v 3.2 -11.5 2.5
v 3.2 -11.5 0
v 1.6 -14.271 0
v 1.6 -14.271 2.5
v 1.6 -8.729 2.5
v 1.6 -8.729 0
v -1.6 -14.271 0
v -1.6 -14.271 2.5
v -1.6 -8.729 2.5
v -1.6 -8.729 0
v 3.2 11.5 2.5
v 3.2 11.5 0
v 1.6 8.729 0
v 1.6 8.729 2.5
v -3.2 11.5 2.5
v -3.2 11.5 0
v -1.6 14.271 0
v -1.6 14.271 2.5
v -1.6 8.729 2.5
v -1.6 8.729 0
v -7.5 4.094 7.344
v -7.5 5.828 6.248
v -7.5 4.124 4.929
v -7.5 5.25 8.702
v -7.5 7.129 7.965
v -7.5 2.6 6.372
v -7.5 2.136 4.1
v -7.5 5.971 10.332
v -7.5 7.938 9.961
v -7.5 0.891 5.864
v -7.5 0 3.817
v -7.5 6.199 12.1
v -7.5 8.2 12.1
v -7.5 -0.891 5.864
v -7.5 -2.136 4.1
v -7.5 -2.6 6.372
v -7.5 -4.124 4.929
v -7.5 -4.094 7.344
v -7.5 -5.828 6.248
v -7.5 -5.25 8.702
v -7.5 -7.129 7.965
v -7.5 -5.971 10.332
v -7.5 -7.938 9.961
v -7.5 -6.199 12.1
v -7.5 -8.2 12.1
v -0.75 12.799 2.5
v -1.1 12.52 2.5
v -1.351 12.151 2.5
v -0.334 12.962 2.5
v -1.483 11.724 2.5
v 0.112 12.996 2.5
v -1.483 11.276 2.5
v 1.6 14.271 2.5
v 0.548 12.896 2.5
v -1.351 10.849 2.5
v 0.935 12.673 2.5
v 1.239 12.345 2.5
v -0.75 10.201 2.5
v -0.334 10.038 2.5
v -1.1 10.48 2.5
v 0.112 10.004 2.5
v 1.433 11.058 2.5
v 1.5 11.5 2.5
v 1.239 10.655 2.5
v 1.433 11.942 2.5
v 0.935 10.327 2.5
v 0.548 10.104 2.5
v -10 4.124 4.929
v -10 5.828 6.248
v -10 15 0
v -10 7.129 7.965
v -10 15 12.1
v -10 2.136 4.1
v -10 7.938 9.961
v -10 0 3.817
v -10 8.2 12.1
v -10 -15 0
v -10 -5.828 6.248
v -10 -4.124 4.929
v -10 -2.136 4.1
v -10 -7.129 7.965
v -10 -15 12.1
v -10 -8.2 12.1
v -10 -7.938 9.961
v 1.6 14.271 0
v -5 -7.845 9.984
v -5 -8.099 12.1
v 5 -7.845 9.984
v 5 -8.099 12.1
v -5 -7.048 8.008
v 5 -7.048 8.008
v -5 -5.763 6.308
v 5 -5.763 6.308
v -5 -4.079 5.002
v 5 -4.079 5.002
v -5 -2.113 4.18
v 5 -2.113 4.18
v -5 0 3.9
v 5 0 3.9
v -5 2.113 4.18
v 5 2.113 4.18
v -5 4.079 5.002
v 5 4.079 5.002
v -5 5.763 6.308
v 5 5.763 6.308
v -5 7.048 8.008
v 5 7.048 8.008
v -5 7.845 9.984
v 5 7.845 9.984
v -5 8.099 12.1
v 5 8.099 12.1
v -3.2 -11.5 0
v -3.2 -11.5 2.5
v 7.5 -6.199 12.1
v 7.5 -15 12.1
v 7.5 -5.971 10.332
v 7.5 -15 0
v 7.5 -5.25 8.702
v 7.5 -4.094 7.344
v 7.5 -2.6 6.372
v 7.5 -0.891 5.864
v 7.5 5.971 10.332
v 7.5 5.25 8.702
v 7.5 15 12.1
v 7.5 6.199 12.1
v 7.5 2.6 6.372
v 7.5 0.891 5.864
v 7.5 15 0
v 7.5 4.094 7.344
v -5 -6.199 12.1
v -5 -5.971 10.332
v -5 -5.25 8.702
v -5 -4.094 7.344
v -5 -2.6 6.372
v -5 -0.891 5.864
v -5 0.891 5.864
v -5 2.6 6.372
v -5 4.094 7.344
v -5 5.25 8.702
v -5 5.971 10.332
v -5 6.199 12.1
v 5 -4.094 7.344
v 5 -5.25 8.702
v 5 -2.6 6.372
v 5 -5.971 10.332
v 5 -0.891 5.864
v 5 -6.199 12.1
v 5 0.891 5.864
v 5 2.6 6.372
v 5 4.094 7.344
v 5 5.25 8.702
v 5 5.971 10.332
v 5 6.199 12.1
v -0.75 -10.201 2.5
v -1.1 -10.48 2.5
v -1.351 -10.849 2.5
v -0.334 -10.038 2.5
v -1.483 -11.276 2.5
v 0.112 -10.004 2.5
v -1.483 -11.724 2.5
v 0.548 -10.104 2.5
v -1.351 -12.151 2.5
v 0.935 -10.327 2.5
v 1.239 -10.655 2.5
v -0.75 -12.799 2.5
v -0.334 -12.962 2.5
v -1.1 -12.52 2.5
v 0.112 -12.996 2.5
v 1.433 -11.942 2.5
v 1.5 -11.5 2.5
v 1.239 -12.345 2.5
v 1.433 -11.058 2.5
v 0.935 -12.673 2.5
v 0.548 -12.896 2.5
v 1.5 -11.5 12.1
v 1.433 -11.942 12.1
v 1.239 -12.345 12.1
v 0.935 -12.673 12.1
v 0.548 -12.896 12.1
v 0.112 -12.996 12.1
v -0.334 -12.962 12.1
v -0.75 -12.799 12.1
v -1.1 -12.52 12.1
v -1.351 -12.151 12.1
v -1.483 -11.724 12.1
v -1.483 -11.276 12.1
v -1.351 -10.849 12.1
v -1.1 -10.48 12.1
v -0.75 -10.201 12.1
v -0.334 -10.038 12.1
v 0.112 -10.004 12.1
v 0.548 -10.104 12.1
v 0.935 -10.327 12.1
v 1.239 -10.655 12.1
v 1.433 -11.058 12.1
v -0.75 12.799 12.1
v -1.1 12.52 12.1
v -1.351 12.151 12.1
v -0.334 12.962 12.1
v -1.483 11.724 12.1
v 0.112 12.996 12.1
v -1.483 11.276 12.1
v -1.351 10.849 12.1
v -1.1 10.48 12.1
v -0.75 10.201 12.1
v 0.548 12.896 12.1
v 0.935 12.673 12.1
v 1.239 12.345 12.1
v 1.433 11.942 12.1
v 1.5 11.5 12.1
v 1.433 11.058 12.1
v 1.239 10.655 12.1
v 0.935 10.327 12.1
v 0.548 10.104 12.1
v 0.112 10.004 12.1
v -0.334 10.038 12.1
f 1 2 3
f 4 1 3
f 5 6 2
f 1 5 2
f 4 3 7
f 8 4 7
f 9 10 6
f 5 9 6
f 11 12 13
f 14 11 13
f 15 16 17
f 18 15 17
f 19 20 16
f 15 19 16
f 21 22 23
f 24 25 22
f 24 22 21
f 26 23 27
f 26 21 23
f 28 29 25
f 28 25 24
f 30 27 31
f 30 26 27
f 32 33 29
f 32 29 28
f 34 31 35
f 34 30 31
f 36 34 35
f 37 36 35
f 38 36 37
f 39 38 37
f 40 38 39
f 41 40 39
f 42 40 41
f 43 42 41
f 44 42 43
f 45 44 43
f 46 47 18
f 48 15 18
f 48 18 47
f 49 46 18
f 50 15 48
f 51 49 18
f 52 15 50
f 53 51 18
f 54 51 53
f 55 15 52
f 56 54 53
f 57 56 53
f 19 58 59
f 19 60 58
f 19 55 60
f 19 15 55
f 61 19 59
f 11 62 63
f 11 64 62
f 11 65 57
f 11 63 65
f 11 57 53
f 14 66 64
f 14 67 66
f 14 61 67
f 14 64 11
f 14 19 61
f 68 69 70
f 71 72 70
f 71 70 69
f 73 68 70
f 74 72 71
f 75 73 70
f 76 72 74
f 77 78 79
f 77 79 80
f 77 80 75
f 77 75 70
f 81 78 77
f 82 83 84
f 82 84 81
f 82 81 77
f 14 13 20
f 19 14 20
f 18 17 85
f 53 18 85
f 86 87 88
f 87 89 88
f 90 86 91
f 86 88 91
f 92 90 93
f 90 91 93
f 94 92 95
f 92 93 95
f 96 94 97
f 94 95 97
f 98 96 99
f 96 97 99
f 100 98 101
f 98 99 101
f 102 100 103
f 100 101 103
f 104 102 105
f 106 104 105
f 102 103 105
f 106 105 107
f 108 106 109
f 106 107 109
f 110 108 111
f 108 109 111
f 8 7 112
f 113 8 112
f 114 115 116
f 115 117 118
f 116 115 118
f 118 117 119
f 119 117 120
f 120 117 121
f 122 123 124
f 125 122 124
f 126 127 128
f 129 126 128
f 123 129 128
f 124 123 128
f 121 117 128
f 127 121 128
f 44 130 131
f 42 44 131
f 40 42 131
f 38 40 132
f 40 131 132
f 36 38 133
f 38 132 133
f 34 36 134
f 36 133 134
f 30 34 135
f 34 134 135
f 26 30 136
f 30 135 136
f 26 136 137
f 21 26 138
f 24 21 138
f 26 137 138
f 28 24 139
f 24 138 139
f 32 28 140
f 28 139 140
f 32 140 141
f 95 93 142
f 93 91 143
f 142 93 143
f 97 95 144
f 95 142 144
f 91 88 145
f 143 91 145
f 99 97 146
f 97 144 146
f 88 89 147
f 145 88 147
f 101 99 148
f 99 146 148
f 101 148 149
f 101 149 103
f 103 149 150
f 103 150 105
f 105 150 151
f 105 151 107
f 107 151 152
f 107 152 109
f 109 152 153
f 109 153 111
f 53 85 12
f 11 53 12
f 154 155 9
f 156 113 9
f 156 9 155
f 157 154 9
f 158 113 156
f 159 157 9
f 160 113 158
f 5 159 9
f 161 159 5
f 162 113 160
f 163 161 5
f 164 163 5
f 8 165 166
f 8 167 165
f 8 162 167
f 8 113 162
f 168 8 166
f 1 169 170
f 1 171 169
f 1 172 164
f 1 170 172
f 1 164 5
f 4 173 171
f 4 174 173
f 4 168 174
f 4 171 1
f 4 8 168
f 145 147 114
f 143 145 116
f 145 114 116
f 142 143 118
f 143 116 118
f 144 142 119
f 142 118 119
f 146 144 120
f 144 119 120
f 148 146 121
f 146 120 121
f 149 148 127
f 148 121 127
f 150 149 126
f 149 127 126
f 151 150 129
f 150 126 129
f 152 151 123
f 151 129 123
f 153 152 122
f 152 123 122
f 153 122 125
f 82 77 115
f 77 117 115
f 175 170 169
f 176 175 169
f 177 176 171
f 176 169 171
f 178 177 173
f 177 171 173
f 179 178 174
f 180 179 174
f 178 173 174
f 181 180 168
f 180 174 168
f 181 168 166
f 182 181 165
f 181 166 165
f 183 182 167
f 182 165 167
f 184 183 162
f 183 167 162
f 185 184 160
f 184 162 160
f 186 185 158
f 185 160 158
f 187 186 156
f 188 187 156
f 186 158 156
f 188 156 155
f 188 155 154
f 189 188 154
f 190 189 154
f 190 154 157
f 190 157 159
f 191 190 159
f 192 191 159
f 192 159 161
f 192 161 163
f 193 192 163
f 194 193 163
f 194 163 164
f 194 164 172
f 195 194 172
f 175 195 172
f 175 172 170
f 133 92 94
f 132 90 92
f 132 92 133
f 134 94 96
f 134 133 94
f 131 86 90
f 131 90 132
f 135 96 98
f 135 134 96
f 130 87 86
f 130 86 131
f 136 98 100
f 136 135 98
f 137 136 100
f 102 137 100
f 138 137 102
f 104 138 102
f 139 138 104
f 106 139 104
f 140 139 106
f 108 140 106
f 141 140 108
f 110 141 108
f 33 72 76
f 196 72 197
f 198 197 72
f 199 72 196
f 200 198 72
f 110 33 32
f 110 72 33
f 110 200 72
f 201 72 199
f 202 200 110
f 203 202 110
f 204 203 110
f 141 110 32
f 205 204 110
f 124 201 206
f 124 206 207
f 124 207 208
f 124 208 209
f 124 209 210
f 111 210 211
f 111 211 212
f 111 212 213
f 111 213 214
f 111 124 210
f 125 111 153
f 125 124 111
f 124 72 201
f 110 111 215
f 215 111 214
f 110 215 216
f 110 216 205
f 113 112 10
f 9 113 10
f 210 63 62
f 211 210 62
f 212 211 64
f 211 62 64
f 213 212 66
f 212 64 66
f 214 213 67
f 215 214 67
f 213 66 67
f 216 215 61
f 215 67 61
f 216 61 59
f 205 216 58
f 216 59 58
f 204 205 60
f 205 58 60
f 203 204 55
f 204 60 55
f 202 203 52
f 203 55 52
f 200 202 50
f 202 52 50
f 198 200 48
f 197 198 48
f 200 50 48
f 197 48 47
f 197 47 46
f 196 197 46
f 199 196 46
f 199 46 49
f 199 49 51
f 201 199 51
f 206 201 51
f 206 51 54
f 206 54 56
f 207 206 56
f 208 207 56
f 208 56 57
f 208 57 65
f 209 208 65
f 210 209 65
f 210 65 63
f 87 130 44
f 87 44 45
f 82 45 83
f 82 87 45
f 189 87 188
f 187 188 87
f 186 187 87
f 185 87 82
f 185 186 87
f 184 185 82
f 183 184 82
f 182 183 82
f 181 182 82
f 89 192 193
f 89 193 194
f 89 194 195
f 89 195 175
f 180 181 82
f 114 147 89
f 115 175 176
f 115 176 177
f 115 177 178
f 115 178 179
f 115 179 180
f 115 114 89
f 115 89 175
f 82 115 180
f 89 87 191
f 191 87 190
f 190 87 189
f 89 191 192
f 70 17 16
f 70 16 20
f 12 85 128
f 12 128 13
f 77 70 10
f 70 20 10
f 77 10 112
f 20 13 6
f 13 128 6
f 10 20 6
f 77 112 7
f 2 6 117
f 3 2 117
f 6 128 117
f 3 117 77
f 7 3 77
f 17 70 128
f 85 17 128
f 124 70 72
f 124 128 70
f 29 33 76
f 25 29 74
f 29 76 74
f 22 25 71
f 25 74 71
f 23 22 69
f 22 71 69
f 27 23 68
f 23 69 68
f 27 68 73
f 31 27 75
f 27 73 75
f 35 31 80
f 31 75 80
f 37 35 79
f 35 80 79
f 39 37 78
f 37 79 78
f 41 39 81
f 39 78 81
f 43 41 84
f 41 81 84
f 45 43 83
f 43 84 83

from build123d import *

# Parameters (mm, degrees)
SKETCH002_R     = 8.1
PAD001_DEPTH    = 5
SKETCH_W        = 15
SKETCH_H        = 30
PAD_DEPTH       = 12.1
SKETCH001_R     = 6.2
POCKET_DEPTH    = 15.001
SKETCH003_R     = 1.5
POCKET001_DEPTH = 12.101
POCKET002_DEPTH = 2.5
SKETCH005_W     = 30
SKETCH005_H     = 12.1
PAD002_DEPTH    = 2.5
SKETCH006_R     = 8.2
POCKET003_DEPTH = 2.5


with BuildPart() as pad001:
    # Sketch002 → Pad001 (new body, symmetric)
    with BuildSketch(Plane.YZ):
        with Locations((0, 12)):
            Circle(SKETCH002_R)
    extrude(amount=PAD001_DEPTH, both=True)


with BuildPart() as pocket003:
    # Sketch → Pad (new body)
    with BuildSketch(Plane.XY):
        Rectangle(SKETCH_W, SKETCH_H)
    extrude(amount=PAD_DEPTH)

    # Sketch001 → Pocket (cut, through all)
    with BuildSketch(Plane.YZ.offset(7.5)):
        with Locations((0, 12)):
            Circle(SKETCH001_R)
    extrude(amount=-POCKET_DEPTH, mode=Mode.SUBTRACT)

    # Cut: cut Pad001
    add(pad001.part, mode=Mode.SUBTRACT)

    # Sketch003 → Pocket001 (cut, through all)
    with BuildSketch(Plane(origin=(0, 0, 0), x_dir=(1, 0, 0), z_dir=(0, 0, -1))):
        with Locations((0, 11.5)):
            Circle(SKETCH003_R)
        with Locations((0, -11.5)):
            Circle(SKETCH003_R)
    extrude(amount=-POCKET001_DEPTH, mode=Mode.SUBTRACT)

    # Sketch004 → Pocket002 (cut)
    with BuildSketch(Plane(origin=(0, 0, 0), x_dir=(1, 0, 0), z_dir=(0, 0, -1))):
        Polygon((3.2, 11.5), (1.6, 14.271281), (-1.6, 14.271281), (-3.2, 11.5), (-1.6, 8.728719), (1.6, 8.728719), align=None)
        Polygon((1.6, -14.271281), (3.2, -11.5), (1.6, -8.728719), (-1.6, -8.728719), (-3.2, -11.5), (-1.6, -14.271281), align=None)
    extrude(amount=-POCKET002_DEPTH, mode=Mode.SUBTRACT)

    # Sketch005 → Pad002 (new body)
    with BuildSketch(Plane(origin=(-7.5, 0, 0), x_dir=(0, -1, 0), z_dir=(-1, 0, 0))):
        with Locations((0, 6.05)):
            Rectangle(SKETCH005_W, SKETCH005_H)
    extrude(amount=PAD002_DEPTH)

    # Sketch006 → Pocket003 (cut)
    with BuildSketch(Plane(origin=(-10, 0, 0), x_dir=(0, -1, 0), z_dir=(-1, 0, 0))):
        with Locations((0, 12.016602)):
            Circle(SKETCH006_R)
    extrude(amount=-POCKET003_DEPTH, mode=Mode.SUBTRACT)


solid = pocket003.part
